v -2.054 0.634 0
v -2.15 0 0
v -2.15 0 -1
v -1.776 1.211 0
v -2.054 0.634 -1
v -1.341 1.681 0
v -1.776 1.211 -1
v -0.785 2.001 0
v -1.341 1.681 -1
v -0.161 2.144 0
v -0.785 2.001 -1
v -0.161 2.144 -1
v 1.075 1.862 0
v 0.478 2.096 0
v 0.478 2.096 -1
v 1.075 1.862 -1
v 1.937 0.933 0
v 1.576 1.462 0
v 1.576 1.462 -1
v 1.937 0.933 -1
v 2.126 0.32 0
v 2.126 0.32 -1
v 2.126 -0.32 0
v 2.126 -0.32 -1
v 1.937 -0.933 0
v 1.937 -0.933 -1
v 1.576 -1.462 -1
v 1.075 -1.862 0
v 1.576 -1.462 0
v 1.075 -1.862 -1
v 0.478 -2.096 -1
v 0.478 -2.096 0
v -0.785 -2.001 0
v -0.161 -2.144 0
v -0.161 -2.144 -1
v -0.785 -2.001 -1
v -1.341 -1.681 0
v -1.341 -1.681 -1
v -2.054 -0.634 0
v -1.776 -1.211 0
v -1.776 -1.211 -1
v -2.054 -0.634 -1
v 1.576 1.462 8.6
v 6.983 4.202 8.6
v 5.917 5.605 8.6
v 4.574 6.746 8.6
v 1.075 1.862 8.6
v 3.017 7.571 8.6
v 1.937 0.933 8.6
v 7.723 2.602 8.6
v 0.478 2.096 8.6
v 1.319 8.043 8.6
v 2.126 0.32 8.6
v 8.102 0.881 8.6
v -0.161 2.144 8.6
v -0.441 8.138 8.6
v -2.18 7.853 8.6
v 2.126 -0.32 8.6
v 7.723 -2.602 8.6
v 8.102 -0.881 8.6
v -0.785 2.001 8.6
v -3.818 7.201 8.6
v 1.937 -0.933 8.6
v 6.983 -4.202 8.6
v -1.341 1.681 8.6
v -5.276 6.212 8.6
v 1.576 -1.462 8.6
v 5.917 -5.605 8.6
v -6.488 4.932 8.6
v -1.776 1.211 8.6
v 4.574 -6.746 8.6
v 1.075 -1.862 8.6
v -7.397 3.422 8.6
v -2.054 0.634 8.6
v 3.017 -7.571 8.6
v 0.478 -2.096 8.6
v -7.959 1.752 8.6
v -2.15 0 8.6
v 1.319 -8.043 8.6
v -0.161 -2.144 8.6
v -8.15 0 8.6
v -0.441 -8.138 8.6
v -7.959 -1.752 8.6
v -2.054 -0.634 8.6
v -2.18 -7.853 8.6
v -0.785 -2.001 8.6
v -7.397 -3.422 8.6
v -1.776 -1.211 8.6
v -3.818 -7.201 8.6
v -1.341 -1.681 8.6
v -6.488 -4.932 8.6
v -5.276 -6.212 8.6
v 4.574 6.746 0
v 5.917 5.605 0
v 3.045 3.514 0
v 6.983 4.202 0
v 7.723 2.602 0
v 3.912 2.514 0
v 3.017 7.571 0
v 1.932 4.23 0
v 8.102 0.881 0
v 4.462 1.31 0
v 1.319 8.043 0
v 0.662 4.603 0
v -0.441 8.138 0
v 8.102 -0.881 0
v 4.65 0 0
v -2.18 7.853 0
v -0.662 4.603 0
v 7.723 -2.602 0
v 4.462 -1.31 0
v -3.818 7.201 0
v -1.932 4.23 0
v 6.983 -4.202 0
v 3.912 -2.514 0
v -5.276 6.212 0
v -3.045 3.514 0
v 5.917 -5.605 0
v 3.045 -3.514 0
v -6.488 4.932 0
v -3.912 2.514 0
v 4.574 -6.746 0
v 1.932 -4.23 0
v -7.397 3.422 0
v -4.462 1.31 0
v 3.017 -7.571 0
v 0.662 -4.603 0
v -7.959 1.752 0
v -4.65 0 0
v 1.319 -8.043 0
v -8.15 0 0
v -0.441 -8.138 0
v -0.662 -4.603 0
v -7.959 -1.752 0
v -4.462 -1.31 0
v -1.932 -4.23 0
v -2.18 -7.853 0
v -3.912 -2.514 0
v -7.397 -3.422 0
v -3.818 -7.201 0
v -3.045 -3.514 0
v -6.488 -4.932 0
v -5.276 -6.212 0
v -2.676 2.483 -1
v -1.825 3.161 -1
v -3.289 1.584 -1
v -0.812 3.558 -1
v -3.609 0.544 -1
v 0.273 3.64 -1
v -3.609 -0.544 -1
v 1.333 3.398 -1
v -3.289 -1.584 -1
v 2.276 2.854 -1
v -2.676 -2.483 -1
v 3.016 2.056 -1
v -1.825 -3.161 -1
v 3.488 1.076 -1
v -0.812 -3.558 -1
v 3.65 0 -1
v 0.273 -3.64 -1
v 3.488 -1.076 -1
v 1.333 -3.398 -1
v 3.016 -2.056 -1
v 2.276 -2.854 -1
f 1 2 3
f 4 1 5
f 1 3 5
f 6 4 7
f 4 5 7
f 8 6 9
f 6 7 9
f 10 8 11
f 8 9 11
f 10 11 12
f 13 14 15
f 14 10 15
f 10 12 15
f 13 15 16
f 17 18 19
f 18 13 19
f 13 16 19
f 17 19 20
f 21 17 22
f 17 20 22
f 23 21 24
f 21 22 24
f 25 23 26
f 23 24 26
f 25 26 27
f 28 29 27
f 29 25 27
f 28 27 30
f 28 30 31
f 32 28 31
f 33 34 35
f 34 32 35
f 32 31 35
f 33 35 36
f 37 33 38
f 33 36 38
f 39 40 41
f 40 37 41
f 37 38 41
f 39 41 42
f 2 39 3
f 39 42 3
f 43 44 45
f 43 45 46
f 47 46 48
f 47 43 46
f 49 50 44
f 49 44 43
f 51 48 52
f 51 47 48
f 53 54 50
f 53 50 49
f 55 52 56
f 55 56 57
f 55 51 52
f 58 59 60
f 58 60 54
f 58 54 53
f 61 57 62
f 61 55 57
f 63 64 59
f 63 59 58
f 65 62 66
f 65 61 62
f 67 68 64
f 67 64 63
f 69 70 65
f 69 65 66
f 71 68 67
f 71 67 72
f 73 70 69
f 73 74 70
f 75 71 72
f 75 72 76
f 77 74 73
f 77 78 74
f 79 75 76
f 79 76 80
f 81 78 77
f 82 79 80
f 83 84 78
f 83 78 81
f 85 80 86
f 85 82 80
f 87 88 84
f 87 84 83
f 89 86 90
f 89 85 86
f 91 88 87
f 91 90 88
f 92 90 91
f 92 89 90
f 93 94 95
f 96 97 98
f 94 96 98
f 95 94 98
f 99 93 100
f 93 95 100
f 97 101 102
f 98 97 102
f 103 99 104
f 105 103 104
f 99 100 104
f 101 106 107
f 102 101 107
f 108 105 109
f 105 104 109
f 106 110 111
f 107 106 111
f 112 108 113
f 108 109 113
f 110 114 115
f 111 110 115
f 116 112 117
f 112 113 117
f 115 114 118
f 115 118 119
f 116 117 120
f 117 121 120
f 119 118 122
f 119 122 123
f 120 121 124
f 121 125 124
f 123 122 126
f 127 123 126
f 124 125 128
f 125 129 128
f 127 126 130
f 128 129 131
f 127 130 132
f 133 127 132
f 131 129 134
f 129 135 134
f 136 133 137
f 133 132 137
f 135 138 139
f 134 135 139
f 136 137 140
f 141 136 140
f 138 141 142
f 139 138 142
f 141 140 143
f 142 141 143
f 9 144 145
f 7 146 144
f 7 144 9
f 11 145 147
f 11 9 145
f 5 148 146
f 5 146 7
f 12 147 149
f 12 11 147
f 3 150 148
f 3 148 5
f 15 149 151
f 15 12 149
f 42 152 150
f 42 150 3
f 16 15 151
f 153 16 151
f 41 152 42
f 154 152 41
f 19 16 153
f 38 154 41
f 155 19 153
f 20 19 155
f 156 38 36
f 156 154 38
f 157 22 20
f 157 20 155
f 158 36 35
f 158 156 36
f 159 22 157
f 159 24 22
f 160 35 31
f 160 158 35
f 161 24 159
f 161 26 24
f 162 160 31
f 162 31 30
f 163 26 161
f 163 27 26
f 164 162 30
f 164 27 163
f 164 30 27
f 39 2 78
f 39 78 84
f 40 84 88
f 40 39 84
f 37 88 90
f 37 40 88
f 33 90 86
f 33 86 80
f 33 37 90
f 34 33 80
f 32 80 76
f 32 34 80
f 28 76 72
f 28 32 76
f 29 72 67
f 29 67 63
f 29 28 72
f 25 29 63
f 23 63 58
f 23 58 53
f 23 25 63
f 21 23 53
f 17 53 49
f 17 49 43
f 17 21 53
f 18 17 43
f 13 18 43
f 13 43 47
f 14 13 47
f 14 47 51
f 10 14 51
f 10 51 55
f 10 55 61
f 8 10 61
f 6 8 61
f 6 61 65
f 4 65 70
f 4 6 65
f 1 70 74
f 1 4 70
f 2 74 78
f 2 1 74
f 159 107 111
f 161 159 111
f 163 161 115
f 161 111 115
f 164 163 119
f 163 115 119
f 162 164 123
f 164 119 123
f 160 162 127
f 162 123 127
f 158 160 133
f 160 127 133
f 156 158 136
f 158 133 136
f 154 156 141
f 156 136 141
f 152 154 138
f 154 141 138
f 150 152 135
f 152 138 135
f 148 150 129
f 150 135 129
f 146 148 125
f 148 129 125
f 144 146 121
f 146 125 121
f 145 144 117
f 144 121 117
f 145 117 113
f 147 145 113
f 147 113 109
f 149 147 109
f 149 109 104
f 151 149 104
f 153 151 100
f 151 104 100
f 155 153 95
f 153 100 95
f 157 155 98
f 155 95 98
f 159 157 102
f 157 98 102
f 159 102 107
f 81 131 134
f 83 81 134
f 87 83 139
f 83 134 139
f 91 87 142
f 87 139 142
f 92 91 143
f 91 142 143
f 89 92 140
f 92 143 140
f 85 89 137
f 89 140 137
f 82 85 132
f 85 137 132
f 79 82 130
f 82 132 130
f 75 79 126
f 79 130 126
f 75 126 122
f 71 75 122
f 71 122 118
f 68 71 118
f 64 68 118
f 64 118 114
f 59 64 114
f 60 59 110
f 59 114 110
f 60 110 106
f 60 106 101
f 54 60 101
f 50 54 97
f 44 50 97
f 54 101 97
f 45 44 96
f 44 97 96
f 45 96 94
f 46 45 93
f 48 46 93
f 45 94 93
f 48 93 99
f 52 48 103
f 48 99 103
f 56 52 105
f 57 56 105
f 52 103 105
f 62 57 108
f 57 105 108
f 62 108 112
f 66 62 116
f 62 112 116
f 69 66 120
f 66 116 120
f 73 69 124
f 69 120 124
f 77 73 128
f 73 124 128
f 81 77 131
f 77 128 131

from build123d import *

# Parameters (mm, degrees)
SKETCH_1_R      = 8.15
SKETCH_1_R_2    = 2.15
EXTRUDE_1_DEPTH = 8.6
EXTRUDE_START   = 1
SKETCH_2_R      = 3.65
SKETCH_2_R_2    = 2.15
EXTRUDE_2_DEPTH = 1
CHAMFER_1_SIZE  = 1


with BuildPart() as part:
    # 草圖1 → 填料-伸長1 (new body)
    with BuildSketch(Plane.XY):
        with Locations(Location((0, 0, 0), (0, 0, 180))):
            Circle(SKETCH_1_R)
        with Locations(Location((0, 0, 0), (0, 0, 180))):
            Circle(SKETCH_1_R_2, mode=Mode.SUBTRACT)
    extrude(amount=EXTRUDE_1_DEPTH)

    # 草圖2 → 填料-伸長2 (add)
    with BuildSketch(Plane(origin=(0, 0, 0), x_dir=(-1, 0, 0), z_dir=(0, 0, -1)).offset(EXTRUDE_START)):
        with Locations(Location((0, 0, 0), (0, 0, 180))):
            Circle(SKETCH_2_R)
        Circle(SKETCH_2_R_2, mode=Mode.SUBTRACT)
    extrude(amount=-EXTRUDE_2_DEPTH)

    # 導角1
    chamfer_1_edges = [part.edges().sort_by_distance(p)[0] for p in [
        (-3.65, 0, 0),
    ]]
    chamfer(chamfer_1_edges, length=CHAMFER_1_SIZE - 0.0001)  # a hair under: the kernel refuses the full size


solid = part.part
